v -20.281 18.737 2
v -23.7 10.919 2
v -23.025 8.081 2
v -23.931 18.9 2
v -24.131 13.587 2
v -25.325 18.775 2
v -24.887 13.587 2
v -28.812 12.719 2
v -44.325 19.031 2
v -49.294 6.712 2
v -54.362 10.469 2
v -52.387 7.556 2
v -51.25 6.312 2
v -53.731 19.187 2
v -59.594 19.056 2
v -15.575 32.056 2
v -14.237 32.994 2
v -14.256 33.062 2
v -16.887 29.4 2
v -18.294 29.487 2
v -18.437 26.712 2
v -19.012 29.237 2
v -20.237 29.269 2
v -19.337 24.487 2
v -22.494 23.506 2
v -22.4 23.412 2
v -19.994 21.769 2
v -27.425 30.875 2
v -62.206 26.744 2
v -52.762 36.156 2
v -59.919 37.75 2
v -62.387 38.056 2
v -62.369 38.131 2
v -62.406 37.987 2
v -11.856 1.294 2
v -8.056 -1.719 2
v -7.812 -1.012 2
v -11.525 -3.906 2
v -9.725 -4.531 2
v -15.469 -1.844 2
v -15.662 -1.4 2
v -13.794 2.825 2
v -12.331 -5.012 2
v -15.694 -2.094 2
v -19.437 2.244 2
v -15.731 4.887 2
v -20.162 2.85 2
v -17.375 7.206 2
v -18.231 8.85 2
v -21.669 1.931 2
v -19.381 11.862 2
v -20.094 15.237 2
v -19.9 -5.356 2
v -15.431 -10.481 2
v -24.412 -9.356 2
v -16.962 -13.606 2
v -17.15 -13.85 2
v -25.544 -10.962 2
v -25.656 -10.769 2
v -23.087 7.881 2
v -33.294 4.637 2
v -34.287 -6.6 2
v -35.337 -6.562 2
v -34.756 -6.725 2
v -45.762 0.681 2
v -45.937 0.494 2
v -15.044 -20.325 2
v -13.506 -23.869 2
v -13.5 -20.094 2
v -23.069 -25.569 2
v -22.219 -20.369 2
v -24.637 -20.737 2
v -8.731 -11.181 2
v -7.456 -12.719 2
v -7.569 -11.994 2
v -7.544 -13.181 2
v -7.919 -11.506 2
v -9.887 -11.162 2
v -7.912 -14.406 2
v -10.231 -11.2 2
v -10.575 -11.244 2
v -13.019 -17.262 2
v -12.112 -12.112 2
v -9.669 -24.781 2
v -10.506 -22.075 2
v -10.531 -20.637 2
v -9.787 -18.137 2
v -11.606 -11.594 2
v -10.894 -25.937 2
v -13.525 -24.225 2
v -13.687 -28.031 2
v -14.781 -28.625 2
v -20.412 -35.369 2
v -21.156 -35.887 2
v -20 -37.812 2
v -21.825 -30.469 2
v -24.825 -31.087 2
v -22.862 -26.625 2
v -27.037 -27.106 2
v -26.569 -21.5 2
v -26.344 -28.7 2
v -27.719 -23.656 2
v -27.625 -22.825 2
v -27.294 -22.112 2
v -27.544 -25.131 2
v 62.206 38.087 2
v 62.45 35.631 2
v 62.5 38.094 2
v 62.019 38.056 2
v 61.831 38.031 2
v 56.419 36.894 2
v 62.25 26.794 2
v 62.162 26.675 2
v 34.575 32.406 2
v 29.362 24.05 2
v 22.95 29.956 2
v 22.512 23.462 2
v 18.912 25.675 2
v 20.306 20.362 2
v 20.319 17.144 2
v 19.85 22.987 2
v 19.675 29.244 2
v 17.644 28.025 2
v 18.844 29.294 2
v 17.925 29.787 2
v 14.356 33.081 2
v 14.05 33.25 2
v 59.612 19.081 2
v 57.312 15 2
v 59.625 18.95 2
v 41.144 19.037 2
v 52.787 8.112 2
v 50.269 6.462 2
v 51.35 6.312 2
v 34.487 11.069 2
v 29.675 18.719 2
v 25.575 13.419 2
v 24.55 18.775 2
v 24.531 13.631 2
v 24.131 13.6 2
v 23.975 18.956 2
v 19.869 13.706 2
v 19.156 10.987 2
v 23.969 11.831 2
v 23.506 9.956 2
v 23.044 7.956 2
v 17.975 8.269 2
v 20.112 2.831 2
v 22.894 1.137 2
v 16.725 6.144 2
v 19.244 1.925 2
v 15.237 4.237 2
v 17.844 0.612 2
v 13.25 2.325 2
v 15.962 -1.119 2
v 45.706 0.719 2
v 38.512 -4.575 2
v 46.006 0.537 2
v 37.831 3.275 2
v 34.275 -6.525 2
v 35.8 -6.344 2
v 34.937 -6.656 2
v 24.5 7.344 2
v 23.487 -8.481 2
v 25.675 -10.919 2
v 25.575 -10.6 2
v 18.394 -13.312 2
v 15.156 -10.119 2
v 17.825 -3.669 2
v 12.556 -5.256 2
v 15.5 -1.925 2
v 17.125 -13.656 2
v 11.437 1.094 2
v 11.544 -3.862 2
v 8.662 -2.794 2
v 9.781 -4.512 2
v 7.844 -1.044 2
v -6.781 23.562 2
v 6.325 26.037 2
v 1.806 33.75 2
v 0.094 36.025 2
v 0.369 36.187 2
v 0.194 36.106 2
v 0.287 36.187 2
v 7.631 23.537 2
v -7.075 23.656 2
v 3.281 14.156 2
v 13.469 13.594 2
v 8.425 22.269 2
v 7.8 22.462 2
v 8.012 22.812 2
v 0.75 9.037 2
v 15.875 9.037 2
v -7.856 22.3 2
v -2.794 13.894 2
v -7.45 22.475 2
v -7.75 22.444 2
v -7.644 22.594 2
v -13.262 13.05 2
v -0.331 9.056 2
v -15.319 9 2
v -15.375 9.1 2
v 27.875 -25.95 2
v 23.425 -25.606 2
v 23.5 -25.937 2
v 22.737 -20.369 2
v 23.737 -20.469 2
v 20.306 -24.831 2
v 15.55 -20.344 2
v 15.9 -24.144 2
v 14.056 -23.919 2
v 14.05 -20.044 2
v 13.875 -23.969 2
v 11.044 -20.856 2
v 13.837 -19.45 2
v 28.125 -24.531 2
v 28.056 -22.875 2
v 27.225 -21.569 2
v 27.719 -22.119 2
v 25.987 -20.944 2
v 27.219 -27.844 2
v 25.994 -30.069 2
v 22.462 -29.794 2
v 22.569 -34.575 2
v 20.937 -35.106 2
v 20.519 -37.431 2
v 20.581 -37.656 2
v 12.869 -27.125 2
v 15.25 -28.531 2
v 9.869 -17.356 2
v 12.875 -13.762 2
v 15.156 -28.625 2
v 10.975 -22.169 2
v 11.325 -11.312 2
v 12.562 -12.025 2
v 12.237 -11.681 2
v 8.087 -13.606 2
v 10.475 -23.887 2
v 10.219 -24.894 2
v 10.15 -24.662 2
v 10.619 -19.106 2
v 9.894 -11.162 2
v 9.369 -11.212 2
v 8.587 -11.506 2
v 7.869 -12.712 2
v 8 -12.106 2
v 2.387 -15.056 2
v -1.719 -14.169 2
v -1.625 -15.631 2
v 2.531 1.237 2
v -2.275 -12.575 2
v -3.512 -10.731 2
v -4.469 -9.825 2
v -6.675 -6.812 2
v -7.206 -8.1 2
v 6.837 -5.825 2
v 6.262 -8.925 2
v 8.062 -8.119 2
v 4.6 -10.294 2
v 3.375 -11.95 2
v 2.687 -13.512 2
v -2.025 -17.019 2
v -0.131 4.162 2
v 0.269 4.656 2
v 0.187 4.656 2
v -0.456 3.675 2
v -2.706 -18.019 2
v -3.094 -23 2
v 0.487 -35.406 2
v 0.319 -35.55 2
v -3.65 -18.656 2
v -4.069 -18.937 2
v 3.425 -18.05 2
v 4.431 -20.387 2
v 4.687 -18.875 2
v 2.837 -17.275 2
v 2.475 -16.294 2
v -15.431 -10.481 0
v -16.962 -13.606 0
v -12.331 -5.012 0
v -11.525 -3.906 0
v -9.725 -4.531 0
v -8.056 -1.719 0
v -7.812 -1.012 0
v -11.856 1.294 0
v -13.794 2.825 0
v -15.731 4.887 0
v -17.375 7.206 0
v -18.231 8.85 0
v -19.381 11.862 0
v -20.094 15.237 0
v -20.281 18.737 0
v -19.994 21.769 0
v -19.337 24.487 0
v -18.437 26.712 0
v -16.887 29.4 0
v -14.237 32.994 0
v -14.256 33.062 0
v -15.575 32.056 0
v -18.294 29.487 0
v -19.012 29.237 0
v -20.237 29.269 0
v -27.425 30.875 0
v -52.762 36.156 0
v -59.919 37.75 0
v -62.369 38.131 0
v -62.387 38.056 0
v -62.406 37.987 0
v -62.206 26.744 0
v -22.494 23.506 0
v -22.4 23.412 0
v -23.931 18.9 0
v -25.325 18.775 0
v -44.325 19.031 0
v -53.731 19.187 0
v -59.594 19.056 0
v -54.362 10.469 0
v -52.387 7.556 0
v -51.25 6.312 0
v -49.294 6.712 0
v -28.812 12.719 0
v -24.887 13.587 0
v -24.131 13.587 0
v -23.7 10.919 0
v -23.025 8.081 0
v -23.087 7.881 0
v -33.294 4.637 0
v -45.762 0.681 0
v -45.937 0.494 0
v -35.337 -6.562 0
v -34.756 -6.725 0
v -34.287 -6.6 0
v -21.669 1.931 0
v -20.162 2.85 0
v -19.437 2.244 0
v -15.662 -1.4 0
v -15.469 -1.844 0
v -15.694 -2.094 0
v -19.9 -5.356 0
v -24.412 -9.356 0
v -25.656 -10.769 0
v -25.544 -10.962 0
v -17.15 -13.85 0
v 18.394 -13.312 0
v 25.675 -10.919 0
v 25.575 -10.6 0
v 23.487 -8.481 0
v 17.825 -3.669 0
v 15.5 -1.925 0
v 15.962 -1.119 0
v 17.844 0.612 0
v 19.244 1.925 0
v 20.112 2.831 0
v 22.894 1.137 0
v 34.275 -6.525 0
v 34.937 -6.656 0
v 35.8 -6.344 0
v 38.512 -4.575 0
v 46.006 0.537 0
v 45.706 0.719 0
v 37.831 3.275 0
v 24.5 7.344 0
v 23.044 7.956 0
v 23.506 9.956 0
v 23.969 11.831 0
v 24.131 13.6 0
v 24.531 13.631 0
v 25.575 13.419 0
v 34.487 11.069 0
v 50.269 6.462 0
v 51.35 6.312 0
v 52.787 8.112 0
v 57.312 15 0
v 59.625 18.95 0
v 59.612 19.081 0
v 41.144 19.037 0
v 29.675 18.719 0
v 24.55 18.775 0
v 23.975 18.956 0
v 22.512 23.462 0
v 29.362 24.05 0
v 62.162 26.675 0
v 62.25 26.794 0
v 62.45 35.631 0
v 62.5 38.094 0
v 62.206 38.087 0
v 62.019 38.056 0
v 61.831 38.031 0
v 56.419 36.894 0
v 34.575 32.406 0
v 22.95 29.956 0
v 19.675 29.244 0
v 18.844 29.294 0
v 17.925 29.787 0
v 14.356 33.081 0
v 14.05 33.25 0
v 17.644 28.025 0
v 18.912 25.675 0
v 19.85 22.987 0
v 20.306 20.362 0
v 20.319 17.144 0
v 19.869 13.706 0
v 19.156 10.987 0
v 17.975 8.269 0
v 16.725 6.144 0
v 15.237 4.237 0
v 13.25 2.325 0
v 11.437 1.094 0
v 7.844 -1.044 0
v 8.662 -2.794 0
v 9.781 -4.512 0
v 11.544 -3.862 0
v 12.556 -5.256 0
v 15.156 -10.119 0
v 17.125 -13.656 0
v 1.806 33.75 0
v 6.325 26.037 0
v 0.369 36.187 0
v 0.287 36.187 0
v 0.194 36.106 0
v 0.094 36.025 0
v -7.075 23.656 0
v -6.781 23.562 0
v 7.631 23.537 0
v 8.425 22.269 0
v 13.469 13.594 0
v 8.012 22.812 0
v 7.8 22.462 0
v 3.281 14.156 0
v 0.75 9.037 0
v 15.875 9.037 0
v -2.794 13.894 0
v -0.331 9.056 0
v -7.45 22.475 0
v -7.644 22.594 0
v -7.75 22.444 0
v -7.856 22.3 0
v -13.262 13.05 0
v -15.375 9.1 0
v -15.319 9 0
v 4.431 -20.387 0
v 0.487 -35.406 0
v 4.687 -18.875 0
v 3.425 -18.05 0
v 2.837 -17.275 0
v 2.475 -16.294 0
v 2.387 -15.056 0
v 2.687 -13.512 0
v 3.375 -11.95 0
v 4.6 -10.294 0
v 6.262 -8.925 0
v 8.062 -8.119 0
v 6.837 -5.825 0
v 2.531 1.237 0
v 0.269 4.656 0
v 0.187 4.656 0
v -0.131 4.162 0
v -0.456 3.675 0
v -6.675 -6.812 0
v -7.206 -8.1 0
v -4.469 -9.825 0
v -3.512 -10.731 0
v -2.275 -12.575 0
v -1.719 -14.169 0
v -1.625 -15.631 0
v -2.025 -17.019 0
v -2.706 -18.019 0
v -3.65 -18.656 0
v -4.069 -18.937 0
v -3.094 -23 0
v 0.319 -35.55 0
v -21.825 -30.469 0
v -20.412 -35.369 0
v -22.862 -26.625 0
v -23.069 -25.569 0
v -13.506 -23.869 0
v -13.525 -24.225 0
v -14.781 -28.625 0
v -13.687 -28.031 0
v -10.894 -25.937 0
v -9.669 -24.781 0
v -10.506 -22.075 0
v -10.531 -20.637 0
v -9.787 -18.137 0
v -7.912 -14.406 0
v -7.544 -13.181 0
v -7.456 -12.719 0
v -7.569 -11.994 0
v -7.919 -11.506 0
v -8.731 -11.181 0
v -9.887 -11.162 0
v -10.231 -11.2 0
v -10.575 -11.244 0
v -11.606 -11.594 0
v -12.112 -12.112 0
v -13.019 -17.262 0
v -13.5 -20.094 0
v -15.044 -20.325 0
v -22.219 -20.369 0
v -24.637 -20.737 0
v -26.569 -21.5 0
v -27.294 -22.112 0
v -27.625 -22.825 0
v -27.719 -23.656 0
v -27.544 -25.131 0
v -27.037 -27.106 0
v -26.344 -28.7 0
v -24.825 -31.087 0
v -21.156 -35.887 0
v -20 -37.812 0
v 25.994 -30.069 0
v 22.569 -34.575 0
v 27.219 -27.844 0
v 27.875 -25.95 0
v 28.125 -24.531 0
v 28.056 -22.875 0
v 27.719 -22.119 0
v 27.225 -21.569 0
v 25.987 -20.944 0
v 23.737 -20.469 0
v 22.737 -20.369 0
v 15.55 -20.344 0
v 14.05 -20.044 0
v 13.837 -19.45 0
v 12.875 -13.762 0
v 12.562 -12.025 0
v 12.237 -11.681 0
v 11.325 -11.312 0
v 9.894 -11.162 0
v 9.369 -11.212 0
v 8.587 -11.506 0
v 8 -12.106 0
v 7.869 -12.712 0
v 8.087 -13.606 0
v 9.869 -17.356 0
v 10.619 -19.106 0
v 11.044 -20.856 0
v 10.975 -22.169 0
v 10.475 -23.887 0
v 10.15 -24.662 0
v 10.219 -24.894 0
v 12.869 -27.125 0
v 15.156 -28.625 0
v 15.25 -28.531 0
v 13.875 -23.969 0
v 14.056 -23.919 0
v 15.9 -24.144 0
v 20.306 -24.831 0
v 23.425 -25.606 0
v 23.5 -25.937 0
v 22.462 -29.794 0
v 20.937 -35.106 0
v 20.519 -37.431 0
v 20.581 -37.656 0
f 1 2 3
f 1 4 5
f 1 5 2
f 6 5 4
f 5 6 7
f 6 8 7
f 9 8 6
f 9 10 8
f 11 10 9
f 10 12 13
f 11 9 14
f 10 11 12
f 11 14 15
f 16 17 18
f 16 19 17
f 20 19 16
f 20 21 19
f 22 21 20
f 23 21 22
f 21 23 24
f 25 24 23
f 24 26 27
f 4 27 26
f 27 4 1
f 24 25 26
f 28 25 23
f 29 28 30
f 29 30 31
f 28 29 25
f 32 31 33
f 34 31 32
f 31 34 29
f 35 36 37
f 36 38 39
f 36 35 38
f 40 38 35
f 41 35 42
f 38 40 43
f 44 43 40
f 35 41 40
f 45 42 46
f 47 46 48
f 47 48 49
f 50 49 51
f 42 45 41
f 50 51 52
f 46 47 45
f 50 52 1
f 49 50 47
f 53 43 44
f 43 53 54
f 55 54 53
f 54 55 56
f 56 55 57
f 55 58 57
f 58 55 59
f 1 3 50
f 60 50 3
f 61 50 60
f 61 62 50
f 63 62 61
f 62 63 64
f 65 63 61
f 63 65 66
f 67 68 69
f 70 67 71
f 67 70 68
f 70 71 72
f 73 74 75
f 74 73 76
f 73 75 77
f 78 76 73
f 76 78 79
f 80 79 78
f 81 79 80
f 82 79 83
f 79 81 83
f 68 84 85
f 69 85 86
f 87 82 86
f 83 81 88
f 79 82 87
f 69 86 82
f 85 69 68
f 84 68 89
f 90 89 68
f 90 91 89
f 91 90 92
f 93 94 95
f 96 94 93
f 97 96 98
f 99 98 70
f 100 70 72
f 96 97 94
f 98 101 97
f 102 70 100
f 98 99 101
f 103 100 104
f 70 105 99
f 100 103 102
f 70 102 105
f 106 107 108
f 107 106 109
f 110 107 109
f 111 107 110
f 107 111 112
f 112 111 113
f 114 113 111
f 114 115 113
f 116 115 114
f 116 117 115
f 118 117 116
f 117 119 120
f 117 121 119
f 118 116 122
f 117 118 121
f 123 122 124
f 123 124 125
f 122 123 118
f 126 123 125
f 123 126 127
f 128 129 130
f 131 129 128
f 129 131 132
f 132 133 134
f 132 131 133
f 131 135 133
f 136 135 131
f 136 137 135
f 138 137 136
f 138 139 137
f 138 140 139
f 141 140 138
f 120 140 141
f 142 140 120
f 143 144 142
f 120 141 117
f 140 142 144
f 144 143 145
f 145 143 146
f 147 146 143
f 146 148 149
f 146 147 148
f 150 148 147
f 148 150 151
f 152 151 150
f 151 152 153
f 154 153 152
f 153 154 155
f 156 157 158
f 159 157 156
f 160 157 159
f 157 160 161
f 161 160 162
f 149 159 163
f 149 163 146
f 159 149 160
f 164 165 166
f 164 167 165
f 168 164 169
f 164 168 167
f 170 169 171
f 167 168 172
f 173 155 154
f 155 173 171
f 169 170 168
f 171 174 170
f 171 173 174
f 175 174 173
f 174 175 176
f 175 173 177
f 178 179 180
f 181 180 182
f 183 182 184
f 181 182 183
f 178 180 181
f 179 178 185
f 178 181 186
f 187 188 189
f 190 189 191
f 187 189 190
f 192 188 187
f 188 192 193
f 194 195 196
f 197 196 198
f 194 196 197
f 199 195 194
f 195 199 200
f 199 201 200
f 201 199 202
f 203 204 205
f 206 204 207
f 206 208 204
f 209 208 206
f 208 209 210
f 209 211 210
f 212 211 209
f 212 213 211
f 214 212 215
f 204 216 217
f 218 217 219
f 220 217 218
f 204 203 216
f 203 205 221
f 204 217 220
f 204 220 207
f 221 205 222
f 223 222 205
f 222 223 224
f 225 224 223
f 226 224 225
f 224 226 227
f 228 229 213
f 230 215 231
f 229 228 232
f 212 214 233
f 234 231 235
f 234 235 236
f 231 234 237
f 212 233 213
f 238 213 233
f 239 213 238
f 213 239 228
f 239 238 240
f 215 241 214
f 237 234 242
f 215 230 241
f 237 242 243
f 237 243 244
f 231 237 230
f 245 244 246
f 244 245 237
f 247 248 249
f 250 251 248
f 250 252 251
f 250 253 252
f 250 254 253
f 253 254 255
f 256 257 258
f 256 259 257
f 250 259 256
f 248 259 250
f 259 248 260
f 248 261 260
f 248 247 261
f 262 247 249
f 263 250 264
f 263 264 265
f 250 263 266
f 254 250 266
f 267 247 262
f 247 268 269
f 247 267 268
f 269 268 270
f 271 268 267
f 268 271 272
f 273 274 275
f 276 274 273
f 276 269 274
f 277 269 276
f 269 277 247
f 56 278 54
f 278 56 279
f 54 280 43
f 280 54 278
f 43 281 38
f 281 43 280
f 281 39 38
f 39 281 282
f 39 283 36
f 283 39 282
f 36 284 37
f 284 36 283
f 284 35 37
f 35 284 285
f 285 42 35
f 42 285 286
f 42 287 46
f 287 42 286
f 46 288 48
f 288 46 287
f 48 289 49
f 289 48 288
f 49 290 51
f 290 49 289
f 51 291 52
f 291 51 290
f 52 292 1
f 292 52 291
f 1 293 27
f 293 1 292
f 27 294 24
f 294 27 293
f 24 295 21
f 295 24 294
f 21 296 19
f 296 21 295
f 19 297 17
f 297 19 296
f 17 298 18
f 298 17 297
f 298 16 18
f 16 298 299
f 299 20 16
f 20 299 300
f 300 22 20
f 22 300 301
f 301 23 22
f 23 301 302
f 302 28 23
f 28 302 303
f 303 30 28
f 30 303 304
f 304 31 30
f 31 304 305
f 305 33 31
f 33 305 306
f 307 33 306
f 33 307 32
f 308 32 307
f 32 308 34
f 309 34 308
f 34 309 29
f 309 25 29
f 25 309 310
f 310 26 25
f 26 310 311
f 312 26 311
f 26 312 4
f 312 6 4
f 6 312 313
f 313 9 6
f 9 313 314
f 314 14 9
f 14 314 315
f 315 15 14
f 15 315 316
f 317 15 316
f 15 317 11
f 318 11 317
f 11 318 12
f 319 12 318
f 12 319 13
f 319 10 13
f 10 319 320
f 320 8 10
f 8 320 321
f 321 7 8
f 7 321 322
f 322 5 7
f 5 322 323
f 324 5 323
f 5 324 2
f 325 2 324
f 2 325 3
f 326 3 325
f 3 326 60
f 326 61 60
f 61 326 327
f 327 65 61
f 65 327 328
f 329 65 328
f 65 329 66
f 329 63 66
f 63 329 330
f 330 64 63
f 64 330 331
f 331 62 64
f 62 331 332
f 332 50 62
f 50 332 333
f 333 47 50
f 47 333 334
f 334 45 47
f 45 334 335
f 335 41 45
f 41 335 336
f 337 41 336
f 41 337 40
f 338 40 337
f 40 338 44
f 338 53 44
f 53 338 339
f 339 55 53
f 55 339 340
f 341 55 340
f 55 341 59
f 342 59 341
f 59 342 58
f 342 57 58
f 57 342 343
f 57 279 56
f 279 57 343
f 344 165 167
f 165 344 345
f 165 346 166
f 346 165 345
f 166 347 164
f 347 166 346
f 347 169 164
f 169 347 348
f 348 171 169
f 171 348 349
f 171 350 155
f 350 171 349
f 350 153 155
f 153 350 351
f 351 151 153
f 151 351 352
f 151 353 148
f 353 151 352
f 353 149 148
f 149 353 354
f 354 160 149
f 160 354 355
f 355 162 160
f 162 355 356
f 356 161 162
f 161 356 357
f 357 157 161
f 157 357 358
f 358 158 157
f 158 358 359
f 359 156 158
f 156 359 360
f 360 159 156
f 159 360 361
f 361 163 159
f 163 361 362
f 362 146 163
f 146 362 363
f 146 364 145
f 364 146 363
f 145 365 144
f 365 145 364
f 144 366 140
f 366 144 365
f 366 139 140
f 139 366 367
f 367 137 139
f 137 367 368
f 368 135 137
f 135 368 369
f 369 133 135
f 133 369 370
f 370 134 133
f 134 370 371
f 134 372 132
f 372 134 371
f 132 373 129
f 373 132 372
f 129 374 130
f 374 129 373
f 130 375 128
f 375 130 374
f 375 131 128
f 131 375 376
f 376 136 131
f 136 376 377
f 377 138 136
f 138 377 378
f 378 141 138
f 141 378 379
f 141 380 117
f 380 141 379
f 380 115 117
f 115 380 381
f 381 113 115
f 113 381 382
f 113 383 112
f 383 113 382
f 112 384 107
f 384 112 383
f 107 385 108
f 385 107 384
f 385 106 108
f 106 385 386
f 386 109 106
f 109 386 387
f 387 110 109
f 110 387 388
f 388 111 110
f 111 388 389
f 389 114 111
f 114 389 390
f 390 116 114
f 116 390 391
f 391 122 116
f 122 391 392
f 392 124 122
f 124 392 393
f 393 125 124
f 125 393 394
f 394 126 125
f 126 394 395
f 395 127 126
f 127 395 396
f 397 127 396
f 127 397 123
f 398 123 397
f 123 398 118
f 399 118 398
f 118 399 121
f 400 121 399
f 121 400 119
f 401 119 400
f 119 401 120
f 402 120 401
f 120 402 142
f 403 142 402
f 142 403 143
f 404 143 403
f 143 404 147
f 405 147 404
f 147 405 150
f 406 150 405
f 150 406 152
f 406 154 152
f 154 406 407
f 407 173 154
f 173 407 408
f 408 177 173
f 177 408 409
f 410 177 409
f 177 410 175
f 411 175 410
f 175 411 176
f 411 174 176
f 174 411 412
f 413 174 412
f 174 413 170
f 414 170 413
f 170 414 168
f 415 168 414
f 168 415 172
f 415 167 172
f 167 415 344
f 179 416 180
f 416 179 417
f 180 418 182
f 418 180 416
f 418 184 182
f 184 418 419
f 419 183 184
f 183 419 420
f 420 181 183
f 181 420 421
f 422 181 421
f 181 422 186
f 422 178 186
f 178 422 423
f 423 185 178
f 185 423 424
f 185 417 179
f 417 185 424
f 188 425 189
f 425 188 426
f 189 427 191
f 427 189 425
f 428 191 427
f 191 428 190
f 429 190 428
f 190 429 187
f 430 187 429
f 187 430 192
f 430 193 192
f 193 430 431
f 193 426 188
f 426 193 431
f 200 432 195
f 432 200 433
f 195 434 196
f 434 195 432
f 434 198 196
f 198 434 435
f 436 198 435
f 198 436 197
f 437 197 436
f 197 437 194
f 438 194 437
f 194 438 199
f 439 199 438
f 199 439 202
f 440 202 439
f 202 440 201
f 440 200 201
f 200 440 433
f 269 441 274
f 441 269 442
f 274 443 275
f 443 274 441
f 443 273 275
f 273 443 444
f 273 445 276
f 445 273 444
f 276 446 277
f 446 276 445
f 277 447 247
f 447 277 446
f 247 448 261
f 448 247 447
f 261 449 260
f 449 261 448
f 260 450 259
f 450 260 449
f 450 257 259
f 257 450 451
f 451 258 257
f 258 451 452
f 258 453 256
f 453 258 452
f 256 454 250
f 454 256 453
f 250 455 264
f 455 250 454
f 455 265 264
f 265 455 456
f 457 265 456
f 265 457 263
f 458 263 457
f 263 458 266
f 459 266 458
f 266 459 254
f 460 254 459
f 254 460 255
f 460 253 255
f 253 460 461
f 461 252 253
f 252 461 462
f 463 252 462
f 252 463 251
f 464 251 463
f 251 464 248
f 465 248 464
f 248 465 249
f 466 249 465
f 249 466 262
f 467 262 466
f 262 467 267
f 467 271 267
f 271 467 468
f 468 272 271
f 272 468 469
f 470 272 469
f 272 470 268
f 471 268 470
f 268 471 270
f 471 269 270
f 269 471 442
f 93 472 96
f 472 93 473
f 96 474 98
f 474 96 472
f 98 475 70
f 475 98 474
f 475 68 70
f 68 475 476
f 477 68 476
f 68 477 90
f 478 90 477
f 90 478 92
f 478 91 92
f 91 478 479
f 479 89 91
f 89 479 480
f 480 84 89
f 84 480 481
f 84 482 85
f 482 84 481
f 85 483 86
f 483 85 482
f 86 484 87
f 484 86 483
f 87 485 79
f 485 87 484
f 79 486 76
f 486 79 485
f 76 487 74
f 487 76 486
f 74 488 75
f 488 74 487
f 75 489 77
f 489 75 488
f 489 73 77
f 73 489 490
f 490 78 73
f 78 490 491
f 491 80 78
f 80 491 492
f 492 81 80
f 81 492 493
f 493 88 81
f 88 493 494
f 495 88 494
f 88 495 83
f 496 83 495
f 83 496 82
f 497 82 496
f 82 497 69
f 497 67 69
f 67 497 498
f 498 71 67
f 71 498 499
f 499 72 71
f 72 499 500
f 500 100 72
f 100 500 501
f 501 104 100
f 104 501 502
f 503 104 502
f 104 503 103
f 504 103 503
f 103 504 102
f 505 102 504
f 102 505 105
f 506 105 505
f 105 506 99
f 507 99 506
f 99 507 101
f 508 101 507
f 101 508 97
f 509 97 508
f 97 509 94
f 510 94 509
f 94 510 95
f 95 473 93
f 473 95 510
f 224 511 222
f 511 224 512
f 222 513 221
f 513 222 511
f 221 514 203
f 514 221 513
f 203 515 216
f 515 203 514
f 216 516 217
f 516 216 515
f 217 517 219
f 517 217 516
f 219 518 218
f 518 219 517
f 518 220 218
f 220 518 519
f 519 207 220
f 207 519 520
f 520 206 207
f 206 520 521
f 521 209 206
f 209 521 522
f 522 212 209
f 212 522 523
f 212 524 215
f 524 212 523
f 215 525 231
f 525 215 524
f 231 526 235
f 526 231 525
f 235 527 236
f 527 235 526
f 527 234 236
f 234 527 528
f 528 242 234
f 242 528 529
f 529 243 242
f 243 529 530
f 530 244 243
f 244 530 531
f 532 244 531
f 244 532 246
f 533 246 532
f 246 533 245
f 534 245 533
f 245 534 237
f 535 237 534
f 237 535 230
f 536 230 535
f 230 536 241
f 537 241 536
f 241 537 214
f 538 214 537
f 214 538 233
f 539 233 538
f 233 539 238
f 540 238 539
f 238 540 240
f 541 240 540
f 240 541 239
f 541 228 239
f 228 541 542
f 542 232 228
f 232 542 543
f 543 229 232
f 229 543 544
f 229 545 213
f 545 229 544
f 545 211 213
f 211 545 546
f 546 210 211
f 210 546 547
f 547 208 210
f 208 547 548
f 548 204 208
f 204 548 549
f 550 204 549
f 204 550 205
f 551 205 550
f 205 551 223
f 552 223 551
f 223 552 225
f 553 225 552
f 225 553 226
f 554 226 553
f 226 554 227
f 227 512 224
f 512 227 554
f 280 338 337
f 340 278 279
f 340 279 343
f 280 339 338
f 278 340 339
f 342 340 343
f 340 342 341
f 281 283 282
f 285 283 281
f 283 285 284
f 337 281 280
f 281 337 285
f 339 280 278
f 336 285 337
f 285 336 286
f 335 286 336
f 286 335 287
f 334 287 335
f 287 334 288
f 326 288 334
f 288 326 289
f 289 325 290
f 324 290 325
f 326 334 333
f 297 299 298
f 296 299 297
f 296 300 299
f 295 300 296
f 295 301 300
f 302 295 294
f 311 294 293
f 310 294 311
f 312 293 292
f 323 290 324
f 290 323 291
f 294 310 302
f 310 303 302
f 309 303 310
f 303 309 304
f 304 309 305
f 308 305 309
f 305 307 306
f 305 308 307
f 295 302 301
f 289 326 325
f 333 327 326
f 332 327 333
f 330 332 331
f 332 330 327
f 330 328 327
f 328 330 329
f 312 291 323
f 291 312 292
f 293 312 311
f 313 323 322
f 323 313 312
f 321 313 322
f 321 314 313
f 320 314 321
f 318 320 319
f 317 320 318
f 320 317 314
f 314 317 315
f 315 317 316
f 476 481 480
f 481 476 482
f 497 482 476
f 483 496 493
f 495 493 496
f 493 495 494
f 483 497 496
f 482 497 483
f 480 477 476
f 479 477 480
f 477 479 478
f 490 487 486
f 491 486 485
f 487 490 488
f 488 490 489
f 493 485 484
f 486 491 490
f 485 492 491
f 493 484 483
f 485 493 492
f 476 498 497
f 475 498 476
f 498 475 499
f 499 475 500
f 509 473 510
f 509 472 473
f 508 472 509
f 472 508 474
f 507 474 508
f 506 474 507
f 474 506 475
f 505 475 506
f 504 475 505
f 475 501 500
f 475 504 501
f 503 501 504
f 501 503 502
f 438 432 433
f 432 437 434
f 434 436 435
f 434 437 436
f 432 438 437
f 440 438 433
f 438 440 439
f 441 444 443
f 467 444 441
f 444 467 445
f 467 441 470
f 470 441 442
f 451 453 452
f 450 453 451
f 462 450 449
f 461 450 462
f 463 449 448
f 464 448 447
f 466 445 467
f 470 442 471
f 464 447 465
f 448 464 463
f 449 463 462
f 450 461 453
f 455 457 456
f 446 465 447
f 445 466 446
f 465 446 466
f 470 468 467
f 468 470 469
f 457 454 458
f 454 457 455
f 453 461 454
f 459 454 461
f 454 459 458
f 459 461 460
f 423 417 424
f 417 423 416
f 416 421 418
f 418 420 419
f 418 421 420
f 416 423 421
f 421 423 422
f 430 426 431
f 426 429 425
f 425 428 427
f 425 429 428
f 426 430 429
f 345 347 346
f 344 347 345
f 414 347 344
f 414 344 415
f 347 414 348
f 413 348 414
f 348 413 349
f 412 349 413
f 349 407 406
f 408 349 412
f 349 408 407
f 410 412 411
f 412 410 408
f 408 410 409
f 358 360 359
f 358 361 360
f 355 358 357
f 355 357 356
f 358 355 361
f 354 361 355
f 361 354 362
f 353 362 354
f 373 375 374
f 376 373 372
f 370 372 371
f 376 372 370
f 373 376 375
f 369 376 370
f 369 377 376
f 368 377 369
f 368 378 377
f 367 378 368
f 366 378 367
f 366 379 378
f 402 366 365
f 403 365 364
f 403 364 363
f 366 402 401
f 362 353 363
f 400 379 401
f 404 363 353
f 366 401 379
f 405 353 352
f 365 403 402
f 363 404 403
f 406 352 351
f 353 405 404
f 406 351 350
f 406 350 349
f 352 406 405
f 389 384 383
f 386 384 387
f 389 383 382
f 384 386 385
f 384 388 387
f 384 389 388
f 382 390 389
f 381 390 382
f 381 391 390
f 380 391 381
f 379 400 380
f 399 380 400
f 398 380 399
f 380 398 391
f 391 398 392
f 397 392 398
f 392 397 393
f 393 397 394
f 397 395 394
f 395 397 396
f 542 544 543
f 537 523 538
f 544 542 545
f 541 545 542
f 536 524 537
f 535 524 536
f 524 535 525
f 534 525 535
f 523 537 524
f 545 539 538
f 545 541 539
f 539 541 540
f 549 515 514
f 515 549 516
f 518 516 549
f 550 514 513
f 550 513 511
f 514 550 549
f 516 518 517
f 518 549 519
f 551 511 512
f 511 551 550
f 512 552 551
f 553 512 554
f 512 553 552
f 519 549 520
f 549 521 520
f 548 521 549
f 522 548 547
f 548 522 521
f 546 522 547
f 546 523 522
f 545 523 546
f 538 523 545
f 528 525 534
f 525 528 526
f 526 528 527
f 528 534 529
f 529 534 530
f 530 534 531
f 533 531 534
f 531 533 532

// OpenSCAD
module b430bfdc8f6614a7c97742c644800d00_1()
{
 /* Generated by trace2scad version 20150415
    http://aggregate.org/MAKE/TRACE2SCAD/
    Optimized model has 279/3844 original points
 */
 color([0.48, 0.48, 0.48])
 assign(minx=0) /* polygon minx=15 */
 assign(miny=0) /* polygon miny=75 */
 assign(maxx=20000) /* polygon maxx=20000 */
 assign(maxy=12250) /* polygon maxy=12226 */
 assign(dx=maxx-minx)
 assign(dy=maxy-miny)
 assign(maxd=((dx>dy)?dx:dy))
 scale([1/maxd, 1/maxd, 1])
 translate([-minx-dx/2, -miny-dy/2, 0])
 linear_extrude(height=1, convexity=279)
 union() {
  union() {
   polygon([[18,12214],[15,12203],[47,10404],[6401,9886],[6416,9871],[6171,9149],[5948,9129],[2908,9170],[1403,9195],[465,9174],[1302,7800],[1618,7334],[1800,7135],[2113,7199],[5390,8160],[6018,8299],[6139,8299],[6208,7872],[6316,7418],[6306,7386],[4673,6867],[2678,6234],[2650,6204],[4346,5075],[4439,5049],[4514,5069],[6533,6434],[6774,6581],[6890,6484],[7494,5901],[7525,5830],[7489,5790],[6816,5268],[6094,4628],[5895,4402],[5913,4371],[7256,3909],[7286,3948],[7531,4448],[8027,5323],[8156,5500],[8444,5400],[8711,5850],[8750,5963],[8103,6332],[7793,6577],[7483,6907],[7220,7278],[7083,7541],[6899,8023],[6785,8563],[6755,9123],[6801,9608],[6906,10043],[7050,10399],[7298,10829],[7722,11404],[7719,11415],[7508,11254],[7073,10843],[6958,10803],[6762,10808],[5612,11065],[1558,11910],[413,12165],[21,12226]], convexity=24);
   polygon([[19923,12214],[19893,12210],[19027,12028],[15532,11310],[13672,10918],[13148,10804],[13015,10812],[12868,10891],[12297,11418],[12248,11445],[12823,10609],[13026,10233],[13176,9803],[13249,9383],[13251,8868],[13179,8318],[13065,7883],[12876,7448],[12676,7108],[12438,6803],[12120,6497],[11830,6300],[11255,5958],[11386,5678],[11565,5403],[11847,5507],[12009,5284],[12425,4506],[12740,3940],[12943,3995],[14108,4378],[14092,4429],[13758,4768],[12852,5538],[12480,5817],[12554,5946],[12855,6223],[13079,6433],[13218,6578],[13663,6307],[15484,5081],[15590,5060],[15728,5110],[16162,5393],[17361,6211],[17313,6240],[16053,6649],[13920,7300],[13687,7398],[13761,7718],[13835,8018],[13861,8301],[13925,8306],[14092,8272],[15518,7896],[18043,7159],[18216,7135],[18446,7423],[19170,8525],[19540,9157],[19538,9178],[16583,9171],[14748,9120],[13928,9129],[13836,9158],[13602,9879],[14698,9973],[19946,10393],[19960,10412],[19992,11826],[20000,12220],[19953,12219]], convexity=23);
   polygon([[10031,11902],[10015,11889],[8868,9910],[8915,9895],[11221,9891],[11012,10291],[10289,11525],[10059,11915],[10046,11915]], convexity=5);
   polygon([[11265,9747],[11248,9719],[10525,8390],[10120,7571],[12540,7571],[12155,8300],[11348,9688],[11282,9775]], convexity=5);
   polygon([[8760,9716],[8743,9693],[7878,8213],[7540,7581],[7549,7565],[9947,7574],[9553,8348],[8808,9721],[8777,9740]], convexity=6);
   polygon([[9979,6791],[9927,6713],[8932,5035],[8847,4829],[9285,4553],[9438,4408],[9636,4113],[9725,3858],[9740,3624],[9676,3402],[9567,3242],[9416,3140],[9349,3095],[9505,2445],[10051,437],[10078,460],[10709,2863],[10750,3105],[10548,3237],[10454,3361],[10396,3518],[10382,3716],[10430,3963],[10540,4213],[10736,4478],[11002,4697],[11290,4826],[11094,5193],[10405,6323],[10043,6870],[10030,6870]], convexity=10);
   polygon([[8363,4333],[8308,4326],[8143,4270],[8062,4187],[7917,3363],[7840,2910],[7593,2873],[6445,2866],[6058,2807],[5749,2685],[5633,2587],[5580,2473],[5565,2340],[5593,2104],[5674,1788],[5785,1533],[6028,1151],[6615,383],[6800,75],[6734,466],[6508,1250],[6342,1865],[6309,2034],[7839,2306],[7836,2249],[7635,1545],[7810,1640],[8257,1975],[8453,2160],[8319,2593],[8315,2823],[8434,3223],[8734,3820],[8793,4016],[8807,4090],[8789,4206],[8733,4284],[8603,4336],[8418,4339]], convexity=11);
   polygon([[11541,4335],[11499,4331],[11374,4284],[11280,4188],[11259,4091],[11294,3948],[11579,3348],[11699,3068],[11767,2788],[11756,2578],[11676,2303],[11624,2179],[11635,2142],[12059,1785],[12425,1545],[12440,1560],[12220,2290],[12249,2298],[12544,2262],[13249,2152],[13748,2028],[13760,1975],[13594,1358],[13350,508],[13283,136],[13293,100],[13611,593],[14159,1314],[14355,1670],[14460,1973],[14500,2200],[14489,2465],[14435,2586],[14356,2674],[14158,2774],[13798,2850],[13638,2866],[12488,2870],[12248,2918],[12214,3013],[12060,3923],[12010,4201],[11958,4256],[11812,4315],[11583,4339]], convexity=14);
  }
 }
}

module b430bfdc8f6614a7c97742c644800d00()
{
 /* all layers combined, scaled to within a 1mm cube */
 scale([1, 1, 1/1])
 difference() {
  union() {
   scale([1,1,2]) translate([0,0,-0.5]) b430bfdc8f6614a7c97742c644800d00_1();
  }
  translate([0,0,-2]) cube([2,2,4],center=true);
 }
}

scale([125, 125, 2]) {
	b430bfdc8f6614a7c97742c644800d00();
}
